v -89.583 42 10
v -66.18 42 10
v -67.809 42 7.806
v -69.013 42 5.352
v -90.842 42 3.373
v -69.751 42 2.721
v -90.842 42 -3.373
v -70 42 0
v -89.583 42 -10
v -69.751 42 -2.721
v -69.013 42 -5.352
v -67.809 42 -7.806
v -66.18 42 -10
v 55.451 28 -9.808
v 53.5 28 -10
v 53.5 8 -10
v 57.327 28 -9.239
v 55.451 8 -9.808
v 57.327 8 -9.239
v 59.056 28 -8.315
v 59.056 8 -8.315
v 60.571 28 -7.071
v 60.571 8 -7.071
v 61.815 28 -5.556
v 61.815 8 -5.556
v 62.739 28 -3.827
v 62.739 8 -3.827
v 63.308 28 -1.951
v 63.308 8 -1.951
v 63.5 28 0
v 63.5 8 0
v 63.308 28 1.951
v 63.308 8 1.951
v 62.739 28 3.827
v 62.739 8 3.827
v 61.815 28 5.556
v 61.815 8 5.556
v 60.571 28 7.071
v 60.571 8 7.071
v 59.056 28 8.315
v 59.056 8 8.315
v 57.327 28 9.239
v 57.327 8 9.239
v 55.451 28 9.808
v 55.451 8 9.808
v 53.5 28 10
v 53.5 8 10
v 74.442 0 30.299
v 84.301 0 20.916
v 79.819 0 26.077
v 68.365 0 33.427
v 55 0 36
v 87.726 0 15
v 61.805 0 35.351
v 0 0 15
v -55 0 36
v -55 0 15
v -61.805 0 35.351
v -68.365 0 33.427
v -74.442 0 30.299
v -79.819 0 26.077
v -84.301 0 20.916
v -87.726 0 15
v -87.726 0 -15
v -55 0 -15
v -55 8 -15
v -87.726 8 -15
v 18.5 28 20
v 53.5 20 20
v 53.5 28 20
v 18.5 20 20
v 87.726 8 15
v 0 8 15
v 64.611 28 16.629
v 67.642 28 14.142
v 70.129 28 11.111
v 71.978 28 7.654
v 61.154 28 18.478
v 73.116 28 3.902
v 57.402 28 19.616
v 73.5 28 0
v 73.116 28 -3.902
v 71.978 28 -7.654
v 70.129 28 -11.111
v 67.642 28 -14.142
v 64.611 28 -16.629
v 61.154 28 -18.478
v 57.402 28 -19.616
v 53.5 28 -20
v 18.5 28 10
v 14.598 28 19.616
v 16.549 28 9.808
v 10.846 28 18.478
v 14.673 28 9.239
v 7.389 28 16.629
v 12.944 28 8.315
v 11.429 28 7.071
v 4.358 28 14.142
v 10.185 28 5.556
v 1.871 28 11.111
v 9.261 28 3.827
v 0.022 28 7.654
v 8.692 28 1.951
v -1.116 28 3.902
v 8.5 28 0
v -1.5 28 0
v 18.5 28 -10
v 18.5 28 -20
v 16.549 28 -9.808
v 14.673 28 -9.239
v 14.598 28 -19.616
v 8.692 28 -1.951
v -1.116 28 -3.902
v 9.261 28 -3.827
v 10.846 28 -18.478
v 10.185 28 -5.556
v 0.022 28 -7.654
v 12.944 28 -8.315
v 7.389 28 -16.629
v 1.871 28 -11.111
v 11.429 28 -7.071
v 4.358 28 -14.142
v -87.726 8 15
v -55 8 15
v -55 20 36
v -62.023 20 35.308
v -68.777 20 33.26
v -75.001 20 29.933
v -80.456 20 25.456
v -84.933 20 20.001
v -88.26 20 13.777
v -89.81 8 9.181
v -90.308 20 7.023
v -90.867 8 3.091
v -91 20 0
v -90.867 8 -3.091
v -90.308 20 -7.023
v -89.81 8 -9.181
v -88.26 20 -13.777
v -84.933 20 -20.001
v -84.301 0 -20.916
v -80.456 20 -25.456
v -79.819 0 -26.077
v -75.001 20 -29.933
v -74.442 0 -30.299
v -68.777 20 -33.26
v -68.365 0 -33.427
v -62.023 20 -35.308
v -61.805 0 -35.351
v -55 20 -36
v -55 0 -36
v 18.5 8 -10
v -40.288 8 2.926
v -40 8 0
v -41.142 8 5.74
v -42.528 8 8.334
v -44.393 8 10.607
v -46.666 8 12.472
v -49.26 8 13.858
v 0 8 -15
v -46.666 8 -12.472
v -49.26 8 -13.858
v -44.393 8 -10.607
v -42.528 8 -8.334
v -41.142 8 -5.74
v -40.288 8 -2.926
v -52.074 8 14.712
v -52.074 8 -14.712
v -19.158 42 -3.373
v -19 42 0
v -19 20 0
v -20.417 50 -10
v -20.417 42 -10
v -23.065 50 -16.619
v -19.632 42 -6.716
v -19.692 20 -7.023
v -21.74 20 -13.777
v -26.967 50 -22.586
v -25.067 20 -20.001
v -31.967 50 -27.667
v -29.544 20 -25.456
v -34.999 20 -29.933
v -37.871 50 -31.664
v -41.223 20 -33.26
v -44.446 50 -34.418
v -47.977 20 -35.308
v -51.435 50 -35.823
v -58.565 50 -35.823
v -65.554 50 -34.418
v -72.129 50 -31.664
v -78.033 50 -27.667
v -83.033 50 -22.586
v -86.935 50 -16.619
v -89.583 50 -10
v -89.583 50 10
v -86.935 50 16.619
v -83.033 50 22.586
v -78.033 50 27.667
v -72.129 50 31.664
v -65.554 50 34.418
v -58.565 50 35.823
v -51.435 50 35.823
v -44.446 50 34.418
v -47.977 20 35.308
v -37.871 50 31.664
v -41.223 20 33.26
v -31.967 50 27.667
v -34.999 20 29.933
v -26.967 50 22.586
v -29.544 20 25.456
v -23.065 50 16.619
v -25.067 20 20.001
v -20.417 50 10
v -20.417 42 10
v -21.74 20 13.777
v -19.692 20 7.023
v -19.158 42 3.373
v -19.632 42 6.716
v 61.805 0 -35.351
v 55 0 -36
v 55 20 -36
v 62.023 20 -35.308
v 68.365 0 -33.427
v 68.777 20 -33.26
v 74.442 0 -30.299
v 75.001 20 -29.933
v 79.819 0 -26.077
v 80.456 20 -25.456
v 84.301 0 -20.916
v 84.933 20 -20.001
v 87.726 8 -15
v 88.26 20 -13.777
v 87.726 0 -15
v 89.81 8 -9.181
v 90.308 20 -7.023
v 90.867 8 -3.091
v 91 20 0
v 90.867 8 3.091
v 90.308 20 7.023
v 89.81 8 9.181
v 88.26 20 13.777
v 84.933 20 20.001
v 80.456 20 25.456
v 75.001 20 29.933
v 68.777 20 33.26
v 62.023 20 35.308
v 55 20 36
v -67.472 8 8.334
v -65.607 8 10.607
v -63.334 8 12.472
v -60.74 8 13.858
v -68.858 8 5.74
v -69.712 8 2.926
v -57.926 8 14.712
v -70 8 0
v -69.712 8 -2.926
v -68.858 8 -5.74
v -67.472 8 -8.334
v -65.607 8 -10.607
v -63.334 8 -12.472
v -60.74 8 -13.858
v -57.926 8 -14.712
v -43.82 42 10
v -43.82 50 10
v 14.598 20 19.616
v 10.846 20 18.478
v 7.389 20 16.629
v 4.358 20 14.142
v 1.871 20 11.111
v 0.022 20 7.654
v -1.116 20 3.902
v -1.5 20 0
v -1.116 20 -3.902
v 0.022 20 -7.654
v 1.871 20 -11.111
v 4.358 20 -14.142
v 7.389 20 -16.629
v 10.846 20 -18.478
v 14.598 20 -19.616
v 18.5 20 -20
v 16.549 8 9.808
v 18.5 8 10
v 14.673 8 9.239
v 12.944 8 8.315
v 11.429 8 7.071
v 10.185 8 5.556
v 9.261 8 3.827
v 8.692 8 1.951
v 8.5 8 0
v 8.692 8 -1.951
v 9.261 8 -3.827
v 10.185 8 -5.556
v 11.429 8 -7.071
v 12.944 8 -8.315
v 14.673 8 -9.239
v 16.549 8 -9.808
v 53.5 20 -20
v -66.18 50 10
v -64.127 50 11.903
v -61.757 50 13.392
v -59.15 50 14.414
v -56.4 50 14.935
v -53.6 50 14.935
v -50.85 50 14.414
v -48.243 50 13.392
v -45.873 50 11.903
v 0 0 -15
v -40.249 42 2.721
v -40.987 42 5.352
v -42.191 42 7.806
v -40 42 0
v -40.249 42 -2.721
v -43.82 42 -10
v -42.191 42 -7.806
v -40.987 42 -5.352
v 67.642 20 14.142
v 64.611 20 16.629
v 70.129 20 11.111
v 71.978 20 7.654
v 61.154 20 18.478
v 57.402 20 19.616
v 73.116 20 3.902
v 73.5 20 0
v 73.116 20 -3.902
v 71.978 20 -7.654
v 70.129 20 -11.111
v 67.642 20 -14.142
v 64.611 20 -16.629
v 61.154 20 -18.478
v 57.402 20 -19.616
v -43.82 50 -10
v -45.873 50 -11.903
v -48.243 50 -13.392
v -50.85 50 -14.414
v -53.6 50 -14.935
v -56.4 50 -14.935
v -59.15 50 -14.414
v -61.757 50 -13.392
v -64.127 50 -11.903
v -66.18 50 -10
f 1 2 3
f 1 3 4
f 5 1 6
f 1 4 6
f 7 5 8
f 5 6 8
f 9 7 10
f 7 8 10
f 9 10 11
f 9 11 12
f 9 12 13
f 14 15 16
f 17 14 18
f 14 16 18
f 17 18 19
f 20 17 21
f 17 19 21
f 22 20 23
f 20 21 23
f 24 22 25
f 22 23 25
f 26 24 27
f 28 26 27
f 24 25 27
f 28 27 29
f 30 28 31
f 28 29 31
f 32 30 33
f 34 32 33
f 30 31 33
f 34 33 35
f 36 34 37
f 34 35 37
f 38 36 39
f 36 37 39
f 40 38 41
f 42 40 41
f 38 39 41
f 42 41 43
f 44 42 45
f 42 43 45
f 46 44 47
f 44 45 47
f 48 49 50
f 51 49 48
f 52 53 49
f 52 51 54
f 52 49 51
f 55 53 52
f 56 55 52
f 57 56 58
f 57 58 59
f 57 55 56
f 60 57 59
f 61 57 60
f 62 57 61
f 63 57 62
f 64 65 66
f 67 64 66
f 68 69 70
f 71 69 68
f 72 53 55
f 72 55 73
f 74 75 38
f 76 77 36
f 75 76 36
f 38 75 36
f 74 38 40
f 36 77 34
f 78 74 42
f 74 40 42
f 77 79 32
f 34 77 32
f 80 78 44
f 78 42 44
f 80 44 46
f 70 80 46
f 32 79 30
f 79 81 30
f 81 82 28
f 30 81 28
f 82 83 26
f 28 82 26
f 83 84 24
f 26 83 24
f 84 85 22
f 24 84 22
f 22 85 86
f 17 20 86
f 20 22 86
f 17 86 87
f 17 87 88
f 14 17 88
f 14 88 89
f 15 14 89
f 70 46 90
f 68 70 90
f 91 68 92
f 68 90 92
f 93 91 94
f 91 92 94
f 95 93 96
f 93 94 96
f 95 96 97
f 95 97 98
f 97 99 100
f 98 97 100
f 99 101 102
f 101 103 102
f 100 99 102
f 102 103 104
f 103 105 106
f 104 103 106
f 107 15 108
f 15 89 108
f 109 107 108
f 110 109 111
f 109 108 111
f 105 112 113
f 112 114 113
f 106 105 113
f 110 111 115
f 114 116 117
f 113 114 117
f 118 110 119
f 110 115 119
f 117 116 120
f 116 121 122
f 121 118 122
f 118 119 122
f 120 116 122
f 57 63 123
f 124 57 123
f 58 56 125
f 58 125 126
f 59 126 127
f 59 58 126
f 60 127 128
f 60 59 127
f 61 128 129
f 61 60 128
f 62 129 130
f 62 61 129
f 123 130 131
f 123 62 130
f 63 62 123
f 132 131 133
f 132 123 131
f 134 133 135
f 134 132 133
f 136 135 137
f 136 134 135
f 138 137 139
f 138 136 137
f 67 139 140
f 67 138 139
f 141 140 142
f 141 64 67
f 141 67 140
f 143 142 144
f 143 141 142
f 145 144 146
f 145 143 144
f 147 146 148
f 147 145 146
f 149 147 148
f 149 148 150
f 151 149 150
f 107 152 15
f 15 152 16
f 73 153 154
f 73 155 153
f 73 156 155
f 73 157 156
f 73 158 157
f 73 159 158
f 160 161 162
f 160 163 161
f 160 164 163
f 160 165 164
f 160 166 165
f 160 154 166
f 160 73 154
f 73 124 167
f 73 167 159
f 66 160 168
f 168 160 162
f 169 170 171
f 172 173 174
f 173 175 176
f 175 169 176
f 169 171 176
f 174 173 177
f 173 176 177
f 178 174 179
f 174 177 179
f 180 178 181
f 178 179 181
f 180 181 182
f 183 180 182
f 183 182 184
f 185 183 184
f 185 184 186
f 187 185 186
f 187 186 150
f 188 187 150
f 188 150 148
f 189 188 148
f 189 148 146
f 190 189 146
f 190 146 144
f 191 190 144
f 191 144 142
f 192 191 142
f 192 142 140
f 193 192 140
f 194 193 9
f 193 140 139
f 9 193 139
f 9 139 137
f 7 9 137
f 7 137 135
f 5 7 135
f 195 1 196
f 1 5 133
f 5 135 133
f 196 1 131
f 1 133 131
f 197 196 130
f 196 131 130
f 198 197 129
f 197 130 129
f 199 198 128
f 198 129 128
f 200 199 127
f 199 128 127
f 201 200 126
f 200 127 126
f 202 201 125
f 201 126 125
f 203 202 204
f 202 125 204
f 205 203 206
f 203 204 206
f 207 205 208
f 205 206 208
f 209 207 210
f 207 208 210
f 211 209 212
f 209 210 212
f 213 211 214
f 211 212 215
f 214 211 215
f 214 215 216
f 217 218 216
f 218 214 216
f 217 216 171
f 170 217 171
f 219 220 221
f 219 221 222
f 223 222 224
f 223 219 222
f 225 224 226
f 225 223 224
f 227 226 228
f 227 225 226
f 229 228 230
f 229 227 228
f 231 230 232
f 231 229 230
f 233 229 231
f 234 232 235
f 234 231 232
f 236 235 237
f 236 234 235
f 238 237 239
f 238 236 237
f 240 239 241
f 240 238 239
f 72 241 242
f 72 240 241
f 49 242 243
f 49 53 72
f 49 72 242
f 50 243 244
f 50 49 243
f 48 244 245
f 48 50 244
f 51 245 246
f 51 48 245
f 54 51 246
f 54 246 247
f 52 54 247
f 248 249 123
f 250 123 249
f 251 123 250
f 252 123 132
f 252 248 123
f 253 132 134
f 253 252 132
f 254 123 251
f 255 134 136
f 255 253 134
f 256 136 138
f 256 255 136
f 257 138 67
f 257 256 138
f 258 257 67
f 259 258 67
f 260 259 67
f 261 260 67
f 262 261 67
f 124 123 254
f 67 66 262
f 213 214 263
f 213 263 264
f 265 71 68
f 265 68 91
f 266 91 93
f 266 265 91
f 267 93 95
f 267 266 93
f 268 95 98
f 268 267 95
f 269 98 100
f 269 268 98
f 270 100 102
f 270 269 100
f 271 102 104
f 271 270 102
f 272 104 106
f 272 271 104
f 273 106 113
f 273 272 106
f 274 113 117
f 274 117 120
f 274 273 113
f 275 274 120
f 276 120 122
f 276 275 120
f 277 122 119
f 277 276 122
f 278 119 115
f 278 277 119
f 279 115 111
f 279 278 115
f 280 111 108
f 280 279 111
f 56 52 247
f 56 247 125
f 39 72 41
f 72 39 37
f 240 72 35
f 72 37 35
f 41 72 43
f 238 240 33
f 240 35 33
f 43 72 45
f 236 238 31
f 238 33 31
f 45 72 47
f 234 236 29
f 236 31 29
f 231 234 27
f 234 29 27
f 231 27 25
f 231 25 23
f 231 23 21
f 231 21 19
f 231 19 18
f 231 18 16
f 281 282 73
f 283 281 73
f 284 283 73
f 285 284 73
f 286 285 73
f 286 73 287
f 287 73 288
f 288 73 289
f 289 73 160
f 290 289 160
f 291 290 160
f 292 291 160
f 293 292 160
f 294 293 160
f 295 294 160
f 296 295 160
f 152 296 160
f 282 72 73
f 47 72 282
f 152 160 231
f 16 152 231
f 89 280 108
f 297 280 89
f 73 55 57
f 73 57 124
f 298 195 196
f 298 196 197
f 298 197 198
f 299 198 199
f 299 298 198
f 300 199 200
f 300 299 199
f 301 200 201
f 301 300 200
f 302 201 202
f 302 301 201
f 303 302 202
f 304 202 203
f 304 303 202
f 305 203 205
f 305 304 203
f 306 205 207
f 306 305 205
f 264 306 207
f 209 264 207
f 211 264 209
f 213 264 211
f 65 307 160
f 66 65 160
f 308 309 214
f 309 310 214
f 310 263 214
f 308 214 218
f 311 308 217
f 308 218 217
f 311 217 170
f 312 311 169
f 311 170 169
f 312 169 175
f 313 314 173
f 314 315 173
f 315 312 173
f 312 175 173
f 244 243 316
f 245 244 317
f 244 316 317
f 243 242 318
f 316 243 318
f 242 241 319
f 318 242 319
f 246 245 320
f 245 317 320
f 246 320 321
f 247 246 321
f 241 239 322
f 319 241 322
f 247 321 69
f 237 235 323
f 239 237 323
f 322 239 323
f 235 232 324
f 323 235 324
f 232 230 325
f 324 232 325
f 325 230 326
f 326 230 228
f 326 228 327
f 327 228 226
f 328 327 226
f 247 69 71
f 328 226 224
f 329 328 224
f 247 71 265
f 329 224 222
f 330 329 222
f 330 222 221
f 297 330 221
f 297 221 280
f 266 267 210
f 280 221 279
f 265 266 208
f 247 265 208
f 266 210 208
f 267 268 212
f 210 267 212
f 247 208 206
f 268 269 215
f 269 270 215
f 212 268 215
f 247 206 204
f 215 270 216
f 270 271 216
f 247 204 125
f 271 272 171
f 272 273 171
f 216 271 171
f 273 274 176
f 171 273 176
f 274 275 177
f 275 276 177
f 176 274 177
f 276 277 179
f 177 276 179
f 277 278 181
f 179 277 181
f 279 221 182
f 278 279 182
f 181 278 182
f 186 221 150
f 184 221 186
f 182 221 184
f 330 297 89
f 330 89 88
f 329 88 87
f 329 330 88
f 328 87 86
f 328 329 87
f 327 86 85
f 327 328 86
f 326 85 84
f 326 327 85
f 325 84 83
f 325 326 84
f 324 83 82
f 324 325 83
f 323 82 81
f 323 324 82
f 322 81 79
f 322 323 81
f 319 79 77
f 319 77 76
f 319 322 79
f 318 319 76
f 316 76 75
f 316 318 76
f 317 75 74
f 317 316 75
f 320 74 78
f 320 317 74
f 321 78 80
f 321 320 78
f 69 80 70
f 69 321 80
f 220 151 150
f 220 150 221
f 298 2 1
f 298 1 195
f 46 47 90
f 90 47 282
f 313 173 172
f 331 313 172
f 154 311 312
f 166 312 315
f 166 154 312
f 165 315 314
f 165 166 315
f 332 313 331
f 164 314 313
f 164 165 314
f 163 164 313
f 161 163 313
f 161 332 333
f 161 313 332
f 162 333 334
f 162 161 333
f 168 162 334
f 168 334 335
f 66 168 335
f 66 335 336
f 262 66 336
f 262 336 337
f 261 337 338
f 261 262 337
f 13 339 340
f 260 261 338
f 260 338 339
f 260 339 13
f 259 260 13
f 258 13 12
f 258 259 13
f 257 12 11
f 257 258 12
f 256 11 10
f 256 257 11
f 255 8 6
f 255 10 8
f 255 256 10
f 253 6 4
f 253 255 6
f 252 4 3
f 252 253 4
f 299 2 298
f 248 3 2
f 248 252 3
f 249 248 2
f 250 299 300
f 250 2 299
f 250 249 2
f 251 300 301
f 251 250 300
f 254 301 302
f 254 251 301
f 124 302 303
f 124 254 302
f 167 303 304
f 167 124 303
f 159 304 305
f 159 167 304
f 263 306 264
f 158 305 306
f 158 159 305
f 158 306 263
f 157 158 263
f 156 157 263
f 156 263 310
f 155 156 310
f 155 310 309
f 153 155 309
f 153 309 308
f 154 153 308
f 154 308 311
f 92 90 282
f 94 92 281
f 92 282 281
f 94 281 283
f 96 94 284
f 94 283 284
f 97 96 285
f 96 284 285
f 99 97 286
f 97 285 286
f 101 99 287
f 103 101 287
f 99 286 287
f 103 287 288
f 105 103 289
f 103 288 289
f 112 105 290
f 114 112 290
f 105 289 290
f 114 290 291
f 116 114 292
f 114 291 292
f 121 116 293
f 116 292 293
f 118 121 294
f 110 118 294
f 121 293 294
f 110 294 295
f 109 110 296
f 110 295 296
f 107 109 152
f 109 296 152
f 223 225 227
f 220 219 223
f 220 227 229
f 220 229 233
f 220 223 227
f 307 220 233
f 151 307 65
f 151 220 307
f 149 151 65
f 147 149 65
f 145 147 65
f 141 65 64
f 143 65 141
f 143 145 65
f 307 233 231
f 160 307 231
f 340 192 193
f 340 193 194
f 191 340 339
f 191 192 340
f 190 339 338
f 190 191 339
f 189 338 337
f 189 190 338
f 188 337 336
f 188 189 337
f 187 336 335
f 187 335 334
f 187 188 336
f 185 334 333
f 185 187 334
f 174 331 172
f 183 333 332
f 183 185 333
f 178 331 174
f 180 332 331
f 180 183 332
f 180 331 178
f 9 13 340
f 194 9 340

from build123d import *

# Parameters (mm, degrees)
BOSS_EXTRUDE1_DEPTH     = 20
SKETCH3_R               = 36
BOSS_EXTRUDE2_DEPTH     = 30
BOSS_EXTRUDE3_DEPTH     = 8
SKETCH6_W               = 30
SKETCH6_H               = 8
SKETCH6_W_2             = 20
CUT_EXTRUDE1_DEPTH      = 92
CUT_EXTRUDE1_DEPTH_BACK = 92
SKETCH7_R               = 15
CUT_EXTRUDE2_DEPTH      = 51
CUT_EXTRUDE2_DEPTH_BACK = 1


with BuildPart() as part:
    # Sketch2 → Boss-Extrude1 (new body)
    with BuildSketch(Plane(origin=(0, 0, 0), x_dir=(1, 0, 0), z_dir=(0, 1, 0))):
        with BuildLine():
            Line((-55, 36), (55, 36))
            ThreePointArc((55, 36), (91, 0), (55, -36))
            Line((55, -36), (-55, -36))
            ThreePointArc((-55, -36), (-91, 0), (-55, 36))
        make_face()
    extrude(amount=BOSS_EXTRUDE1_DEPTH)

    # Sketch3 → Boss-Extrude2 (add)
    with BuildSketch(Plane(origin=(0, 20, 0), x_dir=(1, 0, 0), z_dir=(0, 1, 0))):
        with Locations((-55, 0)):
            Circle(SKETCH3_R)
    extrude(amount=BOSS_EXTRUDE2_DEPTH)

    # Sketch4 → Boss-Extrude3 (add)
    with BuildSketch(Plane(origin=(0, 20, 0), x_dir=(1, 0, 0), z_dir=(0, 1, 0))):
        with BuildLine():
            Line((18.5, 20), (53.5, 20))
            ThreePointArc((53.5, 20), (73.5, 0), (53.5, -20))
            Line((53.5, -20), (18.5, -20))
            ThreePointArc((18.5, -20), (-1.5, 0), (18.5, 20))
        make_face()
    extrude(amount=BOSS_EXTRUDE3_DEPTH)

    # Sketch6 → Cut-Extrude1 (cut, two sides)
    with BuildSketch(Plane(origin=(0, 0, 0), x_dir=(0, 0, -1), z_dir=(1, 0, 0))) as cut_extrude1_sk:
        with Locations((0, 4)):
            Rectangle(SKETCH6_W, SKETCH6_H)
        with Locations((0, 46)):
            Rectangle(SKETCH6_W_2, SKETCH6_H)
    extrude(amount=CUT_EXTRUDE1_DEPTH, mode=Mode.SUBTRACT)
    extrude(cut_extrude1_sk.sketch, amount=-CUT_EXTRUDE1_DEPTH_BACK, mode=Mode.SUBTRACT)

    # Sketch7 → Cut-Extrude2 (cut, two sides)
    with BuildSketch(Plane(origin=(0, 0, 0), x_dir=(1, 0, 0), z_dir=(0, 1, 0))) as cut_extrude2_sk:
        with Locations((-55, 0)):
            Circle(SKETCH7_R)
        with BuildLine():
            Line((18.5, 10), (53.5, 10))
            ThreePointArc((53.5, 10), (63.5, 0), (53.5, -10))
            Line((53.5, -10), (18.5, -10))
            ThreePointArc((18.5, -10), (8.5, 0), (18.5, 10))
        make_face()
    extrude(amount=CUT_EXTRUDE2_DEPTH, mode=Mode.SUBTRACT)
    extrude(cut_extrude2_sk.sketch, amount=-CUT_EXTRUDE2_DEPTH_BACK, mode=Mode.SUBTRACT)


solid = part.part
